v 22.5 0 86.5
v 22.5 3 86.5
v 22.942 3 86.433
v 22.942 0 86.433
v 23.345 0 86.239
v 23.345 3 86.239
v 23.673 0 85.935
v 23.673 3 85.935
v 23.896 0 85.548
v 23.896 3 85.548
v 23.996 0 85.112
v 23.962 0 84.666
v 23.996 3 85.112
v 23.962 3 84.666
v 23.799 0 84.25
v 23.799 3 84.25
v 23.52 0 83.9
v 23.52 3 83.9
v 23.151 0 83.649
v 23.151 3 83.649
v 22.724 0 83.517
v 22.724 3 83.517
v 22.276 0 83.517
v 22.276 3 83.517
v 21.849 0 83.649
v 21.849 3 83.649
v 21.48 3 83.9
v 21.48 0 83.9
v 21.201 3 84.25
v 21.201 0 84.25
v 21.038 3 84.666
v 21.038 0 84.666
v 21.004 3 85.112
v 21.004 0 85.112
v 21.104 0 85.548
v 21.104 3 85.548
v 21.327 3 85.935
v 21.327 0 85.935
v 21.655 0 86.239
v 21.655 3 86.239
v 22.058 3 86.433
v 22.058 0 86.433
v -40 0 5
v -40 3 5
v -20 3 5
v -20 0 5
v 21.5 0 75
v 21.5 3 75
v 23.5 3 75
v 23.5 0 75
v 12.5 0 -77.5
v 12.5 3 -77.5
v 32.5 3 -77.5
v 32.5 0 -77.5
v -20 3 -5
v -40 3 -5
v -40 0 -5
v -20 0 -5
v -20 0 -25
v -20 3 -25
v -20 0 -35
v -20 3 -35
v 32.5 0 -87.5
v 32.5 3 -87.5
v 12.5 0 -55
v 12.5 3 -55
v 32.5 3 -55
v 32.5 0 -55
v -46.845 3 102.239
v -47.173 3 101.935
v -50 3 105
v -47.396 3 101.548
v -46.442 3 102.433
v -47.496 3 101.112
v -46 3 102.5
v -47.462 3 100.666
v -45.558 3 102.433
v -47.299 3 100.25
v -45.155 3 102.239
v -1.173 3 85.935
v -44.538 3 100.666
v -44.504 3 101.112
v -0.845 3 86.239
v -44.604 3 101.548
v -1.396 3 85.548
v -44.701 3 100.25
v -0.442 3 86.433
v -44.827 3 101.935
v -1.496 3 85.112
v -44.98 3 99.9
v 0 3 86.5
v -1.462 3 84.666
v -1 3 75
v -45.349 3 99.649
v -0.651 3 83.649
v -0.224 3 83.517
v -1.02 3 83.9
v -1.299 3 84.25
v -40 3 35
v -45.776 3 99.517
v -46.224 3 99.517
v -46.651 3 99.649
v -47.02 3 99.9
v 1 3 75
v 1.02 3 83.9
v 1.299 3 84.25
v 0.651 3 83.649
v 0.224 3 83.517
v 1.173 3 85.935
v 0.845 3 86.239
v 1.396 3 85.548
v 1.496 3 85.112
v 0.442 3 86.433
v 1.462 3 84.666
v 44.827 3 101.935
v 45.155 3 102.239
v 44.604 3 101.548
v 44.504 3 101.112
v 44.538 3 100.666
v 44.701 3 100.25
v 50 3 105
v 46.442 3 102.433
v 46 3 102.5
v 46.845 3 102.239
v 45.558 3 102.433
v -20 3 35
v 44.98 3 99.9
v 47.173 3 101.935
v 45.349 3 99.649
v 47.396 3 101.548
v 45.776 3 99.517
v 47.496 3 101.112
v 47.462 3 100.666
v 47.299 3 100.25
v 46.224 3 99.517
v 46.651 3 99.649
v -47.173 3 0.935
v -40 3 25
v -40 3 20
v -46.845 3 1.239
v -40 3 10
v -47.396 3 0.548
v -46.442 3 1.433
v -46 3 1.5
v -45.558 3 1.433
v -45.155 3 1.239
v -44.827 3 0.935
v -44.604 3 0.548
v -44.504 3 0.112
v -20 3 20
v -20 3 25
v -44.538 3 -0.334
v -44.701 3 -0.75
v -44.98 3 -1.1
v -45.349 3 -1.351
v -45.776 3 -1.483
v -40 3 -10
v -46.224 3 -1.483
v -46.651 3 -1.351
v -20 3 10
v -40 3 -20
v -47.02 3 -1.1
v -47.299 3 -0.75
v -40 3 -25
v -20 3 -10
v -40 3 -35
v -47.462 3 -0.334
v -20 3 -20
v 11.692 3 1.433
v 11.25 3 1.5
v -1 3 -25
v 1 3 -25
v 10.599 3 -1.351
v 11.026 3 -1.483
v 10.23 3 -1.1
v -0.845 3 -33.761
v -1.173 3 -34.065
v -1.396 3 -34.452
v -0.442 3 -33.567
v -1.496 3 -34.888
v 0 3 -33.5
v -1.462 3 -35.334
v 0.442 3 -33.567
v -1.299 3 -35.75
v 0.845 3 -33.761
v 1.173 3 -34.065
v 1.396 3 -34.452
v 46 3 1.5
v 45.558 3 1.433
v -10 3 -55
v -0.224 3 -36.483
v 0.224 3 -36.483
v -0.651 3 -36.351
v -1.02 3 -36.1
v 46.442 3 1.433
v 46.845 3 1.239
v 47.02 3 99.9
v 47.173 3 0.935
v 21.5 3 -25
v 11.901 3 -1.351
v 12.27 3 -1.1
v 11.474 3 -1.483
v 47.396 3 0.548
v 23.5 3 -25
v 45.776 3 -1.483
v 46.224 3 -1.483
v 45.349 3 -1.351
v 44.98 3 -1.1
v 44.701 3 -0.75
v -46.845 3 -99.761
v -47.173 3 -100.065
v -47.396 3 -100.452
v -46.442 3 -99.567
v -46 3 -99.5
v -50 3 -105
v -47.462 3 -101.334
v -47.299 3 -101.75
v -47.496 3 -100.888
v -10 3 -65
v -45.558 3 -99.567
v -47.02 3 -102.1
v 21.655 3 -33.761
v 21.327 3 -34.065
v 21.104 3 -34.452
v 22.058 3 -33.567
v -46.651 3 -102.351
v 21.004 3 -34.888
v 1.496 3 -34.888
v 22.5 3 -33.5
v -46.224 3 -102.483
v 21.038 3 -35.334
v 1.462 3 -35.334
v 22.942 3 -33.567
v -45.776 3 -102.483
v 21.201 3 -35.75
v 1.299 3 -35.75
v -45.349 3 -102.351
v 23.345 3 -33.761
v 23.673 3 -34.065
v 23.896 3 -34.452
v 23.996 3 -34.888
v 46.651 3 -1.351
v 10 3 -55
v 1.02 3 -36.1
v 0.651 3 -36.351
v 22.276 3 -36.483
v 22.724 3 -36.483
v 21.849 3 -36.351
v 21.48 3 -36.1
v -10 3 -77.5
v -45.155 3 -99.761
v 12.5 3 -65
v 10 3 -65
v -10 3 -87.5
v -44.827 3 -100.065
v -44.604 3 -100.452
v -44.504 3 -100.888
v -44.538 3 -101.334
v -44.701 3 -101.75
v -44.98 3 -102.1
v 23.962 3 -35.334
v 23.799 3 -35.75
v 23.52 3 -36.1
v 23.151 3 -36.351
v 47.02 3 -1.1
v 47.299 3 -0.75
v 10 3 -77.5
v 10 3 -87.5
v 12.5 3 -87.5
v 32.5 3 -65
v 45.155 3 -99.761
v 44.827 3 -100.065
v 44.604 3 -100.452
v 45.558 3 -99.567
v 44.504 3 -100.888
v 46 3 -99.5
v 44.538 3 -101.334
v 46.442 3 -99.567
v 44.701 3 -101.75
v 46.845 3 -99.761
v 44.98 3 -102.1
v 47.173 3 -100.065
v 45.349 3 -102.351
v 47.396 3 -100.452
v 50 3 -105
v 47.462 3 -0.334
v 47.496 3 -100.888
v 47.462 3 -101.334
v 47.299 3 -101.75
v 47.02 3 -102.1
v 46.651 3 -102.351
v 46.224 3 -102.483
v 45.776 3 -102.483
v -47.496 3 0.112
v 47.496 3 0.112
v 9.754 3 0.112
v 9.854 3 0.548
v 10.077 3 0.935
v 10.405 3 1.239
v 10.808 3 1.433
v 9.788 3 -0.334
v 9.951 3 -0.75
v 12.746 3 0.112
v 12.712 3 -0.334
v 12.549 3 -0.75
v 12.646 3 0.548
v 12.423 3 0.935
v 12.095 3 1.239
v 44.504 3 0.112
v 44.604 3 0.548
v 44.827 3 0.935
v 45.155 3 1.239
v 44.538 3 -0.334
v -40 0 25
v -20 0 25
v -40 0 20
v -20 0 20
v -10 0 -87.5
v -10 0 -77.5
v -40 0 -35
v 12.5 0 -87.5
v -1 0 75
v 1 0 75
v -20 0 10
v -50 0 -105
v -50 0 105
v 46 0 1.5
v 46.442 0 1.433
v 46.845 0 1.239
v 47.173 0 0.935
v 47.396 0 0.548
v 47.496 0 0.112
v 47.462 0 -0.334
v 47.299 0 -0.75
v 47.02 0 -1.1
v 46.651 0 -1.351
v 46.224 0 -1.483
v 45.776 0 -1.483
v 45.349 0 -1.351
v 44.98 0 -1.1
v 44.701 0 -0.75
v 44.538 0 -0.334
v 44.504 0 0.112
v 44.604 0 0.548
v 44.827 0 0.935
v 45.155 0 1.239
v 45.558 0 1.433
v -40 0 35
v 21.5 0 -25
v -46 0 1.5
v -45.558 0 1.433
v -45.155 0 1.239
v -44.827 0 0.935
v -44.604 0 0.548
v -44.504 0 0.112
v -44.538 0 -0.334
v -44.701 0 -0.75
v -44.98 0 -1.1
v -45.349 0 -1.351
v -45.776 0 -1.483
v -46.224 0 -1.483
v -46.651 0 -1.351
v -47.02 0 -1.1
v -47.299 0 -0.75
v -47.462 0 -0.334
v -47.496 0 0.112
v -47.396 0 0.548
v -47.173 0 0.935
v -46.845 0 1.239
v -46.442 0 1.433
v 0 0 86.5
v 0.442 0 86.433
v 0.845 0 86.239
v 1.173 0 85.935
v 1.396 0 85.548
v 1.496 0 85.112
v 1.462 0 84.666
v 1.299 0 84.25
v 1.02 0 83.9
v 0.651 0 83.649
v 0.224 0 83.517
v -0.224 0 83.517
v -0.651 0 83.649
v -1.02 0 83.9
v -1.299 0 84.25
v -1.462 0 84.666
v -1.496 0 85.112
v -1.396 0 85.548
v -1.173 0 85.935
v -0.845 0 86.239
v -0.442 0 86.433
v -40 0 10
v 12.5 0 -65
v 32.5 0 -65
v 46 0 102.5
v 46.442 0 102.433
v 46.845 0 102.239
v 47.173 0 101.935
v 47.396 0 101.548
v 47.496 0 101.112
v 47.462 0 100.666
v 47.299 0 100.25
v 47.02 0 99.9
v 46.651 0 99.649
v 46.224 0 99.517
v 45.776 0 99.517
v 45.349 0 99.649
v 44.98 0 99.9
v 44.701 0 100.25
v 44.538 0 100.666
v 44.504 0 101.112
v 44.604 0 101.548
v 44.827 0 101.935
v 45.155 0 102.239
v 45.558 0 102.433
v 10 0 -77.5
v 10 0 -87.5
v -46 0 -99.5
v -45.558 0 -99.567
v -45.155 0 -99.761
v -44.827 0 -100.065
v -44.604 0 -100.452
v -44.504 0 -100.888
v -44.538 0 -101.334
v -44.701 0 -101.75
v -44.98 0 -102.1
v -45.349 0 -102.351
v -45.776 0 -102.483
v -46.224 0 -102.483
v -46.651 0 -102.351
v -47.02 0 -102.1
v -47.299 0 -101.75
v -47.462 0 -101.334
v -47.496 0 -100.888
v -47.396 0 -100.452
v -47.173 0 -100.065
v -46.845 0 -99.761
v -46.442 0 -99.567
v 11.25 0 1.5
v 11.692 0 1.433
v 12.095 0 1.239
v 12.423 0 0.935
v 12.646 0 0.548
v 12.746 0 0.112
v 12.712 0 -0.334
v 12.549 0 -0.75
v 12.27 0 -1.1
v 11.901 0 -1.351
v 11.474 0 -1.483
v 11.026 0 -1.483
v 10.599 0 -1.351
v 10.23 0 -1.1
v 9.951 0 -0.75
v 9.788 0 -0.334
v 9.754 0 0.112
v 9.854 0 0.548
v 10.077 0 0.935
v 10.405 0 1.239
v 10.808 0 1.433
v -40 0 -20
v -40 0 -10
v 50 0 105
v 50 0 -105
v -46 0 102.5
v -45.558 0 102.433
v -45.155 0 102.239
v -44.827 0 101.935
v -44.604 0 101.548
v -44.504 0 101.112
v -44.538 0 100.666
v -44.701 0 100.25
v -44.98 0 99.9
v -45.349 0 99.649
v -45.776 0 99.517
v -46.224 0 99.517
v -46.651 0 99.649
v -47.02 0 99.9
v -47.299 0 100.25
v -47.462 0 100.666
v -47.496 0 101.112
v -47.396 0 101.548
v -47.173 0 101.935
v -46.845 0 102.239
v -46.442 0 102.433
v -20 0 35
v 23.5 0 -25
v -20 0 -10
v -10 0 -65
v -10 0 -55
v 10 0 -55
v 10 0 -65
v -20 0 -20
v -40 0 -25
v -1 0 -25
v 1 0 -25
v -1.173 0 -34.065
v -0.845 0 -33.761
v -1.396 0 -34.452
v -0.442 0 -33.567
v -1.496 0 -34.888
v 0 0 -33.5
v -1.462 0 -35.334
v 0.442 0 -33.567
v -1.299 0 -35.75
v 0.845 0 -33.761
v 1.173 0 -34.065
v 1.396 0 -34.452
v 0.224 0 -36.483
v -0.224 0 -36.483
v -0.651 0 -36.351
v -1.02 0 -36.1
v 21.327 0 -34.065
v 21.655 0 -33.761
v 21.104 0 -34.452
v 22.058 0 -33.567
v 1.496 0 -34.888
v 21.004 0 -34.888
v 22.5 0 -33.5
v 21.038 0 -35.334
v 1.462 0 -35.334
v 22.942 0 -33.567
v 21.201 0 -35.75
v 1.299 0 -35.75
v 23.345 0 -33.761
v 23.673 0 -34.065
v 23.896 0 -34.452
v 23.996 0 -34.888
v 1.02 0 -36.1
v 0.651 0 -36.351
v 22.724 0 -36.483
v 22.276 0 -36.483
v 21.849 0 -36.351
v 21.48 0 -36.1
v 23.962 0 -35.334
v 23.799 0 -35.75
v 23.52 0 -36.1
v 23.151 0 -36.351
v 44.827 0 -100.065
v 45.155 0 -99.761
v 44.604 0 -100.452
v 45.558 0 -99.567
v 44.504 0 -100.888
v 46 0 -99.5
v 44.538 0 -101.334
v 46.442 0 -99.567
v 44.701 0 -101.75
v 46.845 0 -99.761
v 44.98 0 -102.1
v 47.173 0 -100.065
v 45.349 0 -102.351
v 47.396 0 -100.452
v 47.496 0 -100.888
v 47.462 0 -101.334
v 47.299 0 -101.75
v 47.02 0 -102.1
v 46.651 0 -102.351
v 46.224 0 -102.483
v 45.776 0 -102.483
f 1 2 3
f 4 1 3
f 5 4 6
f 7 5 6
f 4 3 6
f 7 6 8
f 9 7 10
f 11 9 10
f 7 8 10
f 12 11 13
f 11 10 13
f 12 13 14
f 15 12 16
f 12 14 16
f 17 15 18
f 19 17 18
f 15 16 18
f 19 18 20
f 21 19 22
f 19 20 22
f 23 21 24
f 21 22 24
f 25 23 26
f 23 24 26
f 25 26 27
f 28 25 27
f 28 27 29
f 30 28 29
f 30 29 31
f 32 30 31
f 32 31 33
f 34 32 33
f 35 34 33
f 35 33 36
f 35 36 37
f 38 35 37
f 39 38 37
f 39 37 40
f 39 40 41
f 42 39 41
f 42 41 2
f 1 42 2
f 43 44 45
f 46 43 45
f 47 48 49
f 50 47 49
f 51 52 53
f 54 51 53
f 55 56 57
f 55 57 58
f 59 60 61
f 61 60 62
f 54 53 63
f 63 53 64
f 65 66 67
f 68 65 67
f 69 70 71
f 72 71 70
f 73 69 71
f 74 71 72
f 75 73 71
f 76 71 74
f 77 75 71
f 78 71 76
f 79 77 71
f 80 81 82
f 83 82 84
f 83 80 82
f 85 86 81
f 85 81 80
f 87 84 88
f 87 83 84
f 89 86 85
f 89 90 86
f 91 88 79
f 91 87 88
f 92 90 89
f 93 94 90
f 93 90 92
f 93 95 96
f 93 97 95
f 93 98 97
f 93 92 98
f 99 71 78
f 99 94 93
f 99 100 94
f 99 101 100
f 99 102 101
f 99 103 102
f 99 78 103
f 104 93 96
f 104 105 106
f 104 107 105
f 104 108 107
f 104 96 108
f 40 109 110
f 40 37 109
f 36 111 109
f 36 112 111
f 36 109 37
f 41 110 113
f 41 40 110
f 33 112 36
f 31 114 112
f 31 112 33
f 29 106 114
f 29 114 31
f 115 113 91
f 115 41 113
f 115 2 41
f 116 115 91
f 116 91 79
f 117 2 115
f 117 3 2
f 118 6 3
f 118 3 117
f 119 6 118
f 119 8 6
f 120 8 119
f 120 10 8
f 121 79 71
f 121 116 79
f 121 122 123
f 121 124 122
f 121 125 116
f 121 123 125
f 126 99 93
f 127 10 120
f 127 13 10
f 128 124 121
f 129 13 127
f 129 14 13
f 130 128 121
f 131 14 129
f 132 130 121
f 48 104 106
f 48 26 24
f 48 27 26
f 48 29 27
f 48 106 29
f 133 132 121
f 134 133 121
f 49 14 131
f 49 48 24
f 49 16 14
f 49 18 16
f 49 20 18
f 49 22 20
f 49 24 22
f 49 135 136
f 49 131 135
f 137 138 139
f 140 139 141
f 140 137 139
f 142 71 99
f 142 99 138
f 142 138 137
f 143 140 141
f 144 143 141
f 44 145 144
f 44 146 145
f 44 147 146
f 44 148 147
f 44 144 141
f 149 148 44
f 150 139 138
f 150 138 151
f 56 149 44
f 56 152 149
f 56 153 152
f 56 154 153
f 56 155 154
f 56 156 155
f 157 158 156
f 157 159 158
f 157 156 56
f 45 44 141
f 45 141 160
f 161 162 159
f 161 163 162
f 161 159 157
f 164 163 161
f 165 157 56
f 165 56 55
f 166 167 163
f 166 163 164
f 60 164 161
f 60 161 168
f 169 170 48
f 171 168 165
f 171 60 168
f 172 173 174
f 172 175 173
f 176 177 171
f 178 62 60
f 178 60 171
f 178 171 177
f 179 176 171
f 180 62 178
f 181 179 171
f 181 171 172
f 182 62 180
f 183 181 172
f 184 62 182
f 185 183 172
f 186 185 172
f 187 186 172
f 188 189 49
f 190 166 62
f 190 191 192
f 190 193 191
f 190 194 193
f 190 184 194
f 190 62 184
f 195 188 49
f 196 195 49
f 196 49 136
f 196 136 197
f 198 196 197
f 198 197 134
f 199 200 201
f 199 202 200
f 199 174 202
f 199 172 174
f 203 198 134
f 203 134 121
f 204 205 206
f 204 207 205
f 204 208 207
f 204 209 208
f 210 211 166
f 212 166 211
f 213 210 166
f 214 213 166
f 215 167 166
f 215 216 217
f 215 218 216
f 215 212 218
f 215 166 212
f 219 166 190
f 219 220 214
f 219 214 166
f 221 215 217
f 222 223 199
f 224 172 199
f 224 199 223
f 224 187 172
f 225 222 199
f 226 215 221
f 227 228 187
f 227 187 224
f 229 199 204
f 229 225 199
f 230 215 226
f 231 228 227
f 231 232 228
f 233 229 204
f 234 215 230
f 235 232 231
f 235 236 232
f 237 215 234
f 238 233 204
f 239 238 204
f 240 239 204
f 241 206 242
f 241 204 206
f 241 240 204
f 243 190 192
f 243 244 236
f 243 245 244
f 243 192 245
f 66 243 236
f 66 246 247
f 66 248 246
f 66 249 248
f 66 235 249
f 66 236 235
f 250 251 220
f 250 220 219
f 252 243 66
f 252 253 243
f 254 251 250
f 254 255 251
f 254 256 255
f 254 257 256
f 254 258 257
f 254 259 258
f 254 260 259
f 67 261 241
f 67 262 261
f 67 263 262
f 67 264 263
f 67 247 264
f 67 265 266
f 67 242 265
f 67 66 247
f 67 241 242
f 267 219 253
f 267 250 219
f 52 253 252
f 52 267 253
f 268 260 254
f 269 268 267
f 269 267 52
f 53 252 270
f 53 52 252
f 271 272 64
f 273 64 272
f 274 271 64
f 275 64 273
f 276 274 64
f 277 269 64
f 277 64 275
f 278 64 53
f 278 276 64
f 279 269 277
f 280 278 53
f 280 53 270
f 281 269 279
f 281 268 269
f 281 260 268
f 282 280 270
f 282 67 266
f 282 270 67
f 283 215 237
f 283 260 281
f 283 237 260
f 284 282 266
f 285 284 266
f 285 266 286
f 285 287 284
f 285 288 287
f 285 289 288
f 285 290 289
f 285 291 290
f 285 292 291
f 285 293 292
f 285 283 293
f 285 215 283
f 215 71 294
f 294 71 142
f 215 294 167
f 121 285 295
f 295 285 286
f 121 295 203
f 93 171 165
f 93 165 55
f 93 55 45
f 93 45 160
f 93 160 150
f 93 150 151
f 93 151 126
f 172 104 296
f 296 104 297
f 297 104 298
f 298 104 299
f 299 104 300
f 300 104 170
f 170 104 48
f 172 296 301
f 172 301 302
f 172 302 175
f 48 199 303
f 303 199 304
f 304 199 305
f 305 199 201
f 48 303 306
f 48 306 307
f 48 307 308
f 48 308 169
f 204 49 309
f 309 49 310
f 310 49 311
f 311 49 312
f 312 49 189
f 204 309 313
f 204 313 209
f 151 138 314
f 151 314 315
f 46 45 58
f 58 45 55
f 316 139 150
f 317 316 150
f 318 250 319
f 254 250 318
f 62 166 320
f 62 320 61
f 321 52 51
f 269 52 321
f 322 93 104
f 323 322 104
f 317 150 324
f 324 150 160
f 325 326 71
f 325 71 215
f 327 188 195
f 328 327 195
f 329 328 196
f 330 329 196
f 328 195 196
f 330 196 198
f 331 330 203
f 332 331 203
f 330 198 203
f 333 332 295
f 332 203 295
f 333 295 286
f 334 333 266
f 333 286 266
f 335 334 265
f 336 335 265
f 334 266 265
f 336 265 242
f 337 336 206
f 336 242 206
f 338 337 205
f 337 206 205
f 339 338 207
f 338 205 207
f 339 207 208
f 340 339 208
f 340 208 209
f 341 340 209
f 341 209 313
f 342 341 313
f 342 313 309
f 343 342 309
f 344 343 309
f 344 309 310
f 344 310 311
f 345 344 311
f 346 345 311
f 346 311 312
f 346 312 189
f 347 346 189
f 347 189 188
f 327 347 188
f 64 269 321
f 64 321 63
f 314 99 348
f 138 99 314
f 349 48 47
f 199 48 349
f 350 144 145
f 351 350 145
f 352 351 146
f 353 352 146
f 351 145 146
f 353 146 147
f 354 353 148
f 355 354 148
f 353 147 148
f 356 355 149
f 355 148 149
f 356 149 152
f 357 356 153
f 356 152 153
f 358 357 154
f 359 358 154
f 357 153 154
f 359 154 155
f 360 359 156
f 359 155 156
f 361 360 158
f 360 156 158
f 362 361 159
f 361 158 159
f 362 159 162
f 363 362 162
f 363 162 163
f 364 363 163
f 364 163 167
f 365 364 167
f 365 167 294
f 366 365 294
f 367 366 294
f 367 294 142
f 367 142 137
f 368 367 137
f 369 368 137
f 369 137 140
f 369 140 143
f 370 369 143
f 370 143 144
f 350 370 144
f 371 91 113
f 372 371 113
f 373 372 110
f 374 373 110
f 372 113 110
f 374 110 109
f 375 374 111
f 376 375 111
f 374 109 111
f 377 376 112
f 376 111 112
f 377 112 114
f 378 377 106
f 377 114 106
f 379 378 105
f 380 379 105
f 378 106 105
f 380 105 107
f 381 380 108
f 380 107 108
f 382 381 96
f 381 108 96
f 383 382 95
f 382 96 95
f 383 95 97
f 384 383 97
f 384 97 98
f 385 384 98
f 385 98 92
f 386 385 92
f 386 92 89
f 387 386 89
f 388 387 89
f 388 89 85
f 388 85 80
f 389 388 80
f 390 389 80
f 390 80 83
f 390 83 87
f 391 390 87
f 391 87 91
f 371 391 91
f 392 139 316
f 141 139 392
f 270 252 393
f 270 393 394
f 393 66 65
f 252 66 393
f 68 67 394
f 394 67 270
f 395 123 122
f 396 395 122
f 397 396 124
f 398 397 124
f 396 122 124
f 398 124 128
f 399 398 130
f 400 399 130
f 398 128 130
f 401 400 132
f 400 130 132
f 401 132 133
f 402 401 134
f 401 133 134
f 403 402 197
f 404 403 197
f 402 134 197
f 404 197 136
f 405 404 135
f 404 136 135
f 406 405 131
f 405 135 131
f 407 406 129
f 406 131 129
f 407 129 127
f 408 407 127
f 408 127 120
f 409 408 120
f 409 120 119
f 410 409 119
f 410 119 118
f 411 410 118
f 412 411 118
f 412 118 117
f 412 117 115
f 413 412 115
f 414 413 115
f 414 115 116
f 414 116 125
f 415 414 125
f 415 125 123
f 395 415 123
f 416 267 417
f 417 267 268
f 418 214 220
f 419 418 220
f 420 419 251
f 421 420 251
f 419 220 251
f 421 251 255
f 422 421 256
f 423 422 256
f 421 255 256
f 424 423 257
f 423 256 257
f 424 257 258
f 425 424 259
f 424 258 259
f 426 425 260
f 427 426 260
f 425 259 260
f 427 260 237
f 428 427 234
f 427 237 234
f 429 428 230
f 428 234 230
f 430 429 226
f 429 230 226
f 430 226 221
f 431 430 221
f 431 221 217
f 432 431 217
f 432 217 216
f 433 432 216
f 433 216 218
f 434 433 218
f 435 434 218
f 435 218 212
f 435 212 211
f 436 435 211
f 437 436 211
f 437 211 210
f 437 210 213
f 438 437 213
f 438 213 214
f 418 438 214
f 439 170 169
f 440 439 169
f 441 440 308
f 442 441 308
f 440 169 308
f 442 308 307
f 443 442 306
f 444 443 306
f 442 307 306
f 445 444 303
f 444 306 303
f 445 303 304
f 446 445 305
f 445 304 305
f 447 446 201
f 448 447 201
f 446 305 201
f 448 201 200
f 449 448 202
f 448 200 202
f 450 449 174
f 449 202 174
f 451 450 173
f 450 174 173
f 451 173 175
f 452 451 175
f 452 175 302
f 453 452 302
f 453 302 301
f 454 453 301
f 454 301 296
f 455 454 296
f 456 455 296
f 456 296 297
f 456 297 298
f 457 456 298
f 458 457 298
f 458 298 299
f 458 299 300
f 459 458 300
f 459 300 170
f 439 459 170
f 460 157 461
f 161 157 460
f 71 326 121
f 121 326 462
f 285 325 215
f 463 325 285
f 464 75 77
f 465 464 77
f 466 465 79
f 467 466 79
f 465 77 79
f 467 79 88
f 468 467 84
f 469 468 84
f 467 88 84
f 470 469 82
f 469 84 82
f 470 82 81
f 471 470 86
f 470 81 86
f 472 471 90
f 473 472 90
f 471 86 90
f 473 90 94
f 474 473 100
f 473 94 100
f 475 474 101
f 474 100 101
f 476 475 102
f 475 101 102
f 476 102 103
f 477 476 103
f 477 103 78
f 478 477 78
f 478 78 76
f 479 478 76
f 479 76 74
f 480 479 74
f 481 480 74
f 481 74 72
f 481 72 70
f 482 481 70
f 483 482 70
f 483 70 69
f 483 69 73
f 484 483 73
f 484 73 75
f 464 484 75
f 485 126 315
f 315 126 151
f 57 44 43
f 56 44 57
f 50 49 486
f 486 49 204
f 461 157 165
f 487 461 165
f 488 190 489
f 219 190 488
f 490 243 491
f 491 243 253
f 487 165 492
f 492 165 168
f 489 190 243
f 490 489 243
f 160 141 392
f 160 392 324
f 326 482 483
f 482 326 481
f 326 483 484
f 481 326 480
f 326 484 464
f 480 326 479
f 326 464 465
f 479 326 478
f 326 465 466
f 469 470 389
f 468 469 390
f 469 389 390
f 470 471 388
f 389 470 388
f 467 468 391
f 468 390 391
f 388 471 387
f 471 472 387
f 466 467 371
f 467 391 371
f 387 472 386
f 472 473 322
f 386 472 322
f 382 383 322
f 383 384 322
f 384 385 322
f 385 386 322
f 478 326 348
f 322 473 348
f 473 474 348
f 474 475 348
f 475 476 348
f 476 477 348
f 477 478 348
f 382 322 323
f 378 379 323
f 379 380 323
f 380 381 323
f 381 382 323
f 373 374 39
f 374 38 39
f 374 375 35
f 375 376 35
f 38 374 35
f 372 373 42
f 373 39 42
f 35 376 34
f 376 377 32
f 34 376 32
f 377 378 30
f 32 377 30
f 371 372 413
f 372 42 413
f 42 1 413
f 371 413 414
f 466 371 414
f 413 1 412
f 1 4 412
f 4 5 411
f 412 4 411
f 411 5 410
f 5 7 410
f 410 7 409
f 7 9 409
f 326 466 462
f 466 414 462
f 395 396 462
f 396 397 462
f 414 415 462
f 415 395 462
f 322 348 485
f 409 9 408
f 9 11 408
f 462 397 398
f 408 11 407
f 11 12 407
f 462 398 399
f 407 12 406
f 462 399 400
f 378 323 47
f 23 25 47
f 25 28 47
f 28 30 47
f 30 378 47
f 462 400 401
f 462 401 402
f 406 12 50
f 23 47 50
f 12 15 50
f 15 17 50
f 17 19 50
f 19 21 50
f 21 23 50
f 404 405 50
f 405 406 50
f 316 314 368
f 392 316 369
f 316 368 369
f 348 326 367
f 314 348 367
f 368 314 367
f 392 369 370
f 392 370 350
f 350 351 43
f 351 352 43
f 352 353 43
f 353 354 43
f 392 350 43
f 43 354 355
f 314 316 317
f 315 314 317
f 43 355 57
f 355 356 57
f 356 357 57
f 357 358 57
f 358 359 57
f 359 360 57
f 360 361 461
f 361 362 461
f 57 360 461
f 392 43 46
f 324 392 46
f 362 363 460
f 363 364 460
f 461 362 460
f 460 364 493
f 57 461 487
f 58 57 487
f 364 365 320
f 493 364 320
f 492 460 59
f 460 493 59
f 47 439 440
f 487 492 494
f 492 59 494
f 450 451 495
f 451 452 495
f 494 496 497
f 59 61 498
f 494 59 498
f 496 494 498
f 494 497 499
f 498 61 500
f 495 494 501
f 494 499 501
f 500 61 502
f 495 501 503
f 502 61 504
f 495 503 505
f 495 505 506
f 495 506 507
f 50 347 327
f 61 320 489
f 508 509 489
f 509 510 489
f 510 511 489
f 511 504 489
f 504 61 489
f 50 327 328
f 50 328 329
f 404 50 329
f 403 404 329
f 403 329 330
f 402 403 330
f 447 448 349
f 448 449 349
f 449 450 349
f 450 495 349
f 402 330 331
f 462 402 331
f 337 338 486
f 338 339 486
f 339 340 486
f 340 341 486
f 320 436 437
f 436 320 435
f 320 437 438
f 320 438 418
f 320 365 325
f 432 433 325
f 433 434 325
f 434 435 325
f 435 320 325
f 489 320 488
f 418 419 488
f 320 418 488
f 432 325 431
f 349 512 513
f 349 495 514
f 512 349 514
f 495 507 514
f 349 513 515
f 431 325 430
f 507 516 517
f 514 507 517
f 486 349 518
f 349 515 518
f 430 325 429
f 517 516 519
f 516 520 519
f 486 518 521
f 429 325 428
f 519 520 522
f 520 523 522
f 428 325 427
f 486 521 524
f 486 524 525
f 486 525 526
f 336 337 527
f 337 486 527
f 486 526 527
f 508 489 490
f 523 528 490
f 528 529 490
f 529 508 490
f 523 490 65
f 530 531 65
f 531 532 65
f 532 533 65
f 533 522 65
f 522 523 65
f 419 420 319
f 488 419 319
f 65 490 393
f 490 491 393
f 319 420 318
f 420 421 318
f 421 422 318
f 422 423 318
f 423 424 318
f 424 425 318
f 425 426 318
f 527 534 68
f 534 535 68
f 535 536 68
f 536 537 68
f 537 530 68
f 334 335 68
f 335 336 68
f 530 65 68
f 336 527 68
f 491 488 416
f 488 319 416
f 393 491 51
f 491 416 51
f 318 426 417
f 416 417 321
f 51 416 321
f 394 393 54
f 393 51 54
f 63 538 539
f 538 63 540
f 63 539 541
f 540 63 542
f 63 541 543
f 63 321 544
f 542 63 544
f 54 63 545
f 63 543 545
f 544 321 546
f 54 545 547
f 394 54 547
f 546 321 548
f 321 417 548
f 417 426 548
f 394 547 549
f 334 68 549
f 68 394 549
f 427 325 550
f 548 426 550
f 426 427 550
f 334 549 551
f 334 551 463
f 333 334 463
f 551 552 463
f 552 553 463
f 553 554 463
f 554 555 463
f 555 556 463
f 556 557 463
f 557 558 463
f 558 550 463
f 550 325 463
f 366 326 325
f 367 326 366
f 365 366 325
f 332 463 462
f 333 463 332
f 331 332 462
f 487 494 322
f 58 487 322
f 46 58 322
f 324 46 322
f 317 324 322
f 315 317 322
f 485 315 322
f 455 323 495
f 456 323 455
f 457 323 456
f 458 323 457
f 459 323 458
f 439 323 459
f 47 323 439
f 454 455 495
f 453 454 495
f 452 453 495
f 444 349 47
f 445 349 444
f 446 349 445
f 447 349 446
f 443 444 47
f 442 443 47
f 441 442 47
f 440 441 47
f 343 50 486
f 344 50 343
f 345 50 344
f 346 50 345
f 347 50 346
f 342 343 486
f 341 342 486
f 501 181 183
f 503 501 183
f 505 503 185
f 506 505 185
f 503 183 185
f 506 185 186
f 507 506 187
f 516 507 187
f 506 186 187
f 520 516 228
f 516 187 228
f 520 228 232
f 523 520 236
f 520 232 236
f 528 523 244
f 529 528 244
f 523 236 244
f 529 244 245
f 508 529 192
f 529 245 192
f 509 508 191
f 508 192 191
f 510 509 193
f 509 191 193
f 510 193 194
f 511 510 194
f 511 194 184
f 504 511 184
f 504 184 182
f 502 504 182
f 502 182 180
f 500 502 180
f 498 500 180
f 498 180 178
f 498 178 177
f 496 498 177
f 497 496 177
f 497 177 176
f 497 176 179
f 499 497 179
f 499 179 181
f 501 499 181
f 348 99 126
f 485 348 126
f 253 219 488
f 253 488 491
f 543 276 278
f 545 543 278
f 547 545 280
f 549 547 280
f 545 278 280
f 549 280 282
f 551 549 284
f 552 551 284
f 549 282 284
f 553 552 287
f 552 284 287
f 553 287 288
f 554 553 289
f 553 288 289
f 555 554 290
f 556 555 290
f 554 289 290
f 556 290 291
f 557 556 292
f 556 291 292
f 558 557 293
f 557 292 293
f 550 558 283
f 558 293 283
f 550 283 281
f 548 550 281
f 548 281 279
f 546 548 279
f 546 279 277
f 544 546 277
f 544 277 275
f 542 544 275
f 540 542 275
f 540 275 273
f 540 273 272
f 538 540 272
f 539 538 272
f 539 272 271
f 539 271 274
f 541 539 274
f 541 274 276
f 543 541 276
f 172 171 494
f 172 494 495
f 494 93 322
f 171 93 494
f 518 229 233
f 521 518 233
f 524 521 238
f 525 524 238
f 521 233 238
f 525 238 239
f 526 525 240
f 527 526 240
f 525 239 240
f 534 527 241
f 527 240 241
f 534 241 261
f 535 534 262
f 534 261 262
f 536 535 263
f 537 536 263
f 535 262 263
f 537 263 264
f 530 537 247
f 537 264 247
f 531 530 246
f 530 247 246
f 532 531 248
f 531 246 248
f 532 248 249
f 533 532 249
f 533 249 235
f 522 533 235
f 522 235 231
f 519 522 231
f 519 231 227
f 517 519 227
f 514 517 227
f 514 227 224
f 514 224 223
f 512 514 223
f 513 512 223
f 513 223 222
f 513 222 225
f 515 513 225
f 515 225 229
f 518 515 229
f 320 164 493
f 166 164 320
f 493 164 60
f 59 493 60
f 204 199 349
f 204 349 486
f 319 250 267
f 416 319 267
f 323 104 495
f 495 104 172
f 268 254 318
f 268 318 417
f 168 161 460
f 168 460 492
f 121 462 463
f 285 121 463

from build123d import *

# Parameters (mm, degrees)
SKETCH1_W            = 100
SKETCH1_H            = 210
BOSS_EXTRUDE1_DEPTH  = 3
CUT_EXTRUDE1_REACH   = 118.336
SKETCH3_R            = 1.5
SKETCH3_W            = 2
SKETCH3_H            = 100
LPATTERN1_COUNT      = 2
LPATTERN1_PITCH      = 22.5
CUT_EXTRUDE2_REACH   = 118.336
SKETCH4_W            = 20
SKETCH4_H            = 10
LPATTERN2_COUNT      = 2
LPATTERN2_PITCH      = 22.5
LPATTERN2_COUNT_DIR2 = 2
LPATTERN2_PITCH_DIR2 = 22.5
CUT_EXTRUDE3_REACH   = 118.336
SKETCH5_R            = 1.5
CUT_EXTRUDE4_REACH   = 118.336
SKETCH6_W            = 20
SKETCH6_H            = 10
LPATTERN3_COUNT      = 5
LPATTERN3_PITCH      = 15
CUT_EXTRUDE5_REACH   = 118.336
SKETCH7_R            = 1.5
CUT_EXTRUDE6_REACH   = 118.336
SKETCH8_R            = 1.5


with BuildPart() as part:
    # Sketch1 → Boss-Extrude1 (new body)
    with BuildSketch(Plane(origin=(0, 0, 0), x_dir=(1, 0, 0), z_dir=(0, 1, 0))):
        Rectangle(SKETCH1_W, SKETCH1_H)
    extrude(amount=BOSS_EXTRUDE1_DEPTH)

    # Sketch3 → Cut-Extrude1 (cut, up to next)
    with BuildSketch(Plane(origin=(0, 3, 0), x_dir=(1, 0, 0), z_dir=(0, 1, 0)), mode=Mode.PRIVATE) as cut_extrude1_sk1:
        with Locations(Location((0, -85, 0), (0, 0, 270))):
            Circle(SKETCH3_R)
    cut_extrude1_tool1 = extrude(cut_extrude1_sk1.sketch, amount=-CUT_EXTRUDE1_REACH, mode=Mode.PRIVATE) & part.part
    # Sketch3 → Cut-Extrude1 (cut, up to next)
    with BuildSketch(Plane(origin=(0, 3, 0), x_dir=(1, 0, 0), z_dir=(0, 1, 0)), mode=Mode.PRIVATE) as cut_extrude1_sk2:
        with Locations(Location((0, 35, 0), (0, 0, 270))):
            Circle(SKETCH3_R)
    cut_extrude1_tool2 = extrude(cut_extrude1_sk2.sketch, amount=-CUT_EXTRUDE1_REACH, mode=Mode.PRIVATE) & part.part
    # Sketch3 → Cut-Extrude1 (cut, up to next)
    with BuildSketch(Plane(origin=(0, 3, 0), x_dir=(1, 0, 0), z_dir=(0, 1, 0)), mode=Mode.PRIVATE) as cut_extrude1_sk3:
        with Locations((0, -25)):
            Rectangle(SKETCH3_W, SKETCH3_H)
    cut_extrude1_tool3 = extrude(cut_extrude1_sk3.sketch, amount=-CUT_EXTRUDE1_REACH, mode=Mode.PRIVATE) & part.part
    cut_extrude1_1 = cut_extrude1_tool1.solids().sort_by_distance((0, 3, 85))[0]
    add(cut_extrude1_1, mode=Mode.SUBTRACT)
    cut_extrude1_2 = cut_extrude1_tool2.solids().sort_by_distance((0, 3, -35))[0]
    add(cut_extrude1_2, mode=Mode.SUBTRACT)
    cut_extrude1_3 = cut_extrude1_tool3.solids().sort_by_distance((0, 3, 25))[0]
    add(cut_extrude1_3, mode=Mode.SUBTRACT)
    cut_extrude1 = cut_extrude1_1 + cut_extrude1_2 + cut_extrude1_3  # Cut-Extrude1 as one shape, for the pattern or mirror that repeats it

    # LPattern1: Cut-Extrude1 ×2
    with Locations(*[(i * LPATTERN1_PITCH, 0, 0) for i in range(1, LPATTERN1_COUNT)]):
        add(cut_extrude1, mode=Mode.SUBTRACT)

    # Sketch4 → Cut-Extrude2 (cut, up to next)
    with BuildSketch(Plane(origin=(0, 3, 0), x_dir=(1, 0, 0), z_dir=(0, 1, 0)), mode=Mode.PRIVATE) as cut_extrude2_sk1:
        with Locations((0, 60)):
            Rectangle(SKETCH4_W, SKETCH4_H)
    cut_extrude2_tool1 = extrude(cut_extrude2_sk1.sketch, amount=-CUT_EXTRUDE2_REACH, mode=Mode.PRIVATE) & part.part
    cut_extrude2 = cut_extrude2_tool1.solids().sort_by_distance((0, 3, -60))[0]
    add(cut_extrude2, mode=Mode.SUBTRACT)

    # LPattern2: Cut-Extrude2 2 × 2
    with Locations(*[(i * LPATTERN2_PITCH, 0, -j * LPATTERN2_PITCH_DIR2) for i in range(LPATTERN2_COUNT) for j in range(LPATTERN2_COUNT_DIR2) if (i, j) != (0, 0)]):
        add(cut_extrude2, mode=Mode.SUBTRACT)

    # Sketch5 → Cut-Extrude3 (cut, up to next)
    with BuildSketch(Plane(origin=(0, 3, 0), x_dir=(1, 0, 0), z_dir=(0, 1, 0)), mode=Mode.PRIVATE) as cut_extrude3_sk1:
        with Locations(Location((-46, 101, 0), (0, 0, 270))):
            Circle(SKETCH5_R)
    cut_extrude3_tool1 = extrude(cut_extrude3_sk1.sketch, amount=-CUT_EXTRUDE3_REACH, mode=Mode.PRIVATE) & part.part
    # Sketch5 → Cut-Extrude3 (cut, up to next)
    with BuildSketch(Plane(origin=(0, 3, 0), x_dir=(1, 0, 0), z_dir=(0, 1, 0)), mode=Mode.PRIVATE) as cut_extrude3_sk2:
        with Locations(Location((46, 101, 0), (0, 0, 270))):
            Circle(SKETCH5_R)
    cut_extrude3_tool2 = extrude(cut_extrude3_sk2.sketch, amount=-CUT_EXTRUDE3_REACH, mode=Mode.PRIVATE) & part.part
    # Sketch5 → Cut-Extrude3 (cut, up to next)
    with BuildSketch(Plane(origin=(0, 3, 0), x_dir=(1, 0, 0), z_dir=(0, 1, 0)), mode=Mode.PRIVATE) as cut_extrude3_sk3:
        with Locations(Location((46, -101, 0), (0, 0, 270))):
            Circle(SKETCH5_R)
    cut_extrude3_tool3 = extrude(cut_extrude3_sk3.sketch, amount=-CUT_EXTRUDE3_REACH, mode=Mode.PRIVATE) & part.part
    # Sketch5 → Cut-Extrude3 (cut, up to next)
    with BuildSketch(Plane(origin=(0, 3, 0), x_dir=(1, 0, 0), z_dir=(0, 1, 0)), mode=Mode.PRIVATE) as cut_extrude3_sk4:
        with Locations(Location((-46, -101, 0), (0, 0, 270))):
            Circle(SKETCH5_R)
    cut_extrude3_tool4 = extrude(cut_extrude3_sk4.sketch, amount=-CUT_EXTRUDE3_REACH, mode=Mode.PRIVATE) & part.part
    # Sketch5 → Cut-Extrude3 (cut, up to next)
    with BuildSketch(Plane(origin=(0, 3, 0), x_dir=(1, 0, 0), z_dir=(0, 1, 0)), mode=Mode.PRIVATE) as cut_extrude3_sk5:
        with Locations(Location((11.25, 0, 0), (0, 0, 270))):
            Circle(SKETCH5_R)
    cut_extrude3_tool5 = extrude(cut_extrude3_sk5.sketch, amount=-CUT_EXTRUDE3_REACH, mode=Mode.PRIVATE) & part.part
    add(cut_extrude3_tool1.solids().sort_by_distance((-46, 3, -101))[0], mode=Mode.SUBTRACT)
    add(cut_extrude3_tool2.solids().sort_by_distance((46, 3, -101))[0], mode=Mode.SUBTRACT)
    add(cut_extrude3_tool3.solids().sort_by_distance((46, 3, 101))[0], mode=Mode.SUBTRACT)
    add(cut_extrude3_tool4.solids().sort_by_distance((-46, 3, 101))[0], mode=Mode.SUBTRACT)
    add(cut_extrude3_tool5.solids().sort_by_distance((11.25, 3, 0))[0], mode=Mode.SUBTRACT)

    # Sketch6 → Cut-Extrude4 (cut, up to next)
    with BuildSketch(Plane(origin=(0, 3, 0), x_dir=(1, 0, 0), z_dir=(0, 1, 0)), mode=Mode.PRIVATE) as cut_extrude4_sk1:
        with Locations((-30, 30)):
            Rectangle(SKETCH6_W, SKETCH6_H)
    cut_extrude4_tool1 = extrude(cut_extrude4_sk1.sketch, amount=-CUT_EXTRUDE4_REACH, mode=Mode.PRIVATE) & part.part
    cut_extrude4 = cut_extrude4_tool1.solids().sort_by_distance((-30, 3, -30))[0]
    add(cut_extrude4, mode=Mode.SUBTRACT)

    # LPattern3: Cut-Extrude4 ×5
    with Locations(*[(0, 0, i * LPATTERN3_PITCH) for i in range(1, LPATTERN3_COUNT)]):
        add(cut_extrude4, mode=Mode.SUBTRACT)

    # Sketch7 → Cut-Extrude5 (cut, up to next)
    with BuildSketch(Plane(origin=(0, 3, 0), x_dir=(1, 0, 0), z_dir=(0, 1, 0)), mode=Mode.PRIVATE) as cut_extrude5_sk1:
        with Locations(Location((-46, 0, 0), (0, 0, 270))):
            Circle(SKETCH7_R)
    cut_extrude5_tool1 = extrude(cut_extrude5_sk1.sketch, amount=-CUT_EXTRUDE5_REACH, mode=Mode.PRIVATE) & part.part
    add(cut_extrude5_tool1.solids().sort_by_distance((-46, 3, 0))[0], mode=Mode.SUBTRACT)

    # Sketch8 → Cut-Extrude6 (cut, up to next)
    with BuildSketch(Plane(origin=(0, 3, 0), x_dir=(1, 0, 0), z_dir=(0, 1, 0)), mode=Mode.PRIVATE) as cut_extrude6_sk1:
        with Locations(Location((46, 0, 0), (0, 0, 270))):
            Circle(SKETCH8_R)
    cut_extrude6_tool1 = extrude(cut_extrude6_sk1.sketch, amount=-CUT_EXTRUDE6_REACH, mode=Mode.PRIVATE) & part.part
    add(cut_extrude6_tool1.solids().sort_by_distance((46, 3, 0))[0], mode=Mode.SUBTRACT)


solid = part.part
